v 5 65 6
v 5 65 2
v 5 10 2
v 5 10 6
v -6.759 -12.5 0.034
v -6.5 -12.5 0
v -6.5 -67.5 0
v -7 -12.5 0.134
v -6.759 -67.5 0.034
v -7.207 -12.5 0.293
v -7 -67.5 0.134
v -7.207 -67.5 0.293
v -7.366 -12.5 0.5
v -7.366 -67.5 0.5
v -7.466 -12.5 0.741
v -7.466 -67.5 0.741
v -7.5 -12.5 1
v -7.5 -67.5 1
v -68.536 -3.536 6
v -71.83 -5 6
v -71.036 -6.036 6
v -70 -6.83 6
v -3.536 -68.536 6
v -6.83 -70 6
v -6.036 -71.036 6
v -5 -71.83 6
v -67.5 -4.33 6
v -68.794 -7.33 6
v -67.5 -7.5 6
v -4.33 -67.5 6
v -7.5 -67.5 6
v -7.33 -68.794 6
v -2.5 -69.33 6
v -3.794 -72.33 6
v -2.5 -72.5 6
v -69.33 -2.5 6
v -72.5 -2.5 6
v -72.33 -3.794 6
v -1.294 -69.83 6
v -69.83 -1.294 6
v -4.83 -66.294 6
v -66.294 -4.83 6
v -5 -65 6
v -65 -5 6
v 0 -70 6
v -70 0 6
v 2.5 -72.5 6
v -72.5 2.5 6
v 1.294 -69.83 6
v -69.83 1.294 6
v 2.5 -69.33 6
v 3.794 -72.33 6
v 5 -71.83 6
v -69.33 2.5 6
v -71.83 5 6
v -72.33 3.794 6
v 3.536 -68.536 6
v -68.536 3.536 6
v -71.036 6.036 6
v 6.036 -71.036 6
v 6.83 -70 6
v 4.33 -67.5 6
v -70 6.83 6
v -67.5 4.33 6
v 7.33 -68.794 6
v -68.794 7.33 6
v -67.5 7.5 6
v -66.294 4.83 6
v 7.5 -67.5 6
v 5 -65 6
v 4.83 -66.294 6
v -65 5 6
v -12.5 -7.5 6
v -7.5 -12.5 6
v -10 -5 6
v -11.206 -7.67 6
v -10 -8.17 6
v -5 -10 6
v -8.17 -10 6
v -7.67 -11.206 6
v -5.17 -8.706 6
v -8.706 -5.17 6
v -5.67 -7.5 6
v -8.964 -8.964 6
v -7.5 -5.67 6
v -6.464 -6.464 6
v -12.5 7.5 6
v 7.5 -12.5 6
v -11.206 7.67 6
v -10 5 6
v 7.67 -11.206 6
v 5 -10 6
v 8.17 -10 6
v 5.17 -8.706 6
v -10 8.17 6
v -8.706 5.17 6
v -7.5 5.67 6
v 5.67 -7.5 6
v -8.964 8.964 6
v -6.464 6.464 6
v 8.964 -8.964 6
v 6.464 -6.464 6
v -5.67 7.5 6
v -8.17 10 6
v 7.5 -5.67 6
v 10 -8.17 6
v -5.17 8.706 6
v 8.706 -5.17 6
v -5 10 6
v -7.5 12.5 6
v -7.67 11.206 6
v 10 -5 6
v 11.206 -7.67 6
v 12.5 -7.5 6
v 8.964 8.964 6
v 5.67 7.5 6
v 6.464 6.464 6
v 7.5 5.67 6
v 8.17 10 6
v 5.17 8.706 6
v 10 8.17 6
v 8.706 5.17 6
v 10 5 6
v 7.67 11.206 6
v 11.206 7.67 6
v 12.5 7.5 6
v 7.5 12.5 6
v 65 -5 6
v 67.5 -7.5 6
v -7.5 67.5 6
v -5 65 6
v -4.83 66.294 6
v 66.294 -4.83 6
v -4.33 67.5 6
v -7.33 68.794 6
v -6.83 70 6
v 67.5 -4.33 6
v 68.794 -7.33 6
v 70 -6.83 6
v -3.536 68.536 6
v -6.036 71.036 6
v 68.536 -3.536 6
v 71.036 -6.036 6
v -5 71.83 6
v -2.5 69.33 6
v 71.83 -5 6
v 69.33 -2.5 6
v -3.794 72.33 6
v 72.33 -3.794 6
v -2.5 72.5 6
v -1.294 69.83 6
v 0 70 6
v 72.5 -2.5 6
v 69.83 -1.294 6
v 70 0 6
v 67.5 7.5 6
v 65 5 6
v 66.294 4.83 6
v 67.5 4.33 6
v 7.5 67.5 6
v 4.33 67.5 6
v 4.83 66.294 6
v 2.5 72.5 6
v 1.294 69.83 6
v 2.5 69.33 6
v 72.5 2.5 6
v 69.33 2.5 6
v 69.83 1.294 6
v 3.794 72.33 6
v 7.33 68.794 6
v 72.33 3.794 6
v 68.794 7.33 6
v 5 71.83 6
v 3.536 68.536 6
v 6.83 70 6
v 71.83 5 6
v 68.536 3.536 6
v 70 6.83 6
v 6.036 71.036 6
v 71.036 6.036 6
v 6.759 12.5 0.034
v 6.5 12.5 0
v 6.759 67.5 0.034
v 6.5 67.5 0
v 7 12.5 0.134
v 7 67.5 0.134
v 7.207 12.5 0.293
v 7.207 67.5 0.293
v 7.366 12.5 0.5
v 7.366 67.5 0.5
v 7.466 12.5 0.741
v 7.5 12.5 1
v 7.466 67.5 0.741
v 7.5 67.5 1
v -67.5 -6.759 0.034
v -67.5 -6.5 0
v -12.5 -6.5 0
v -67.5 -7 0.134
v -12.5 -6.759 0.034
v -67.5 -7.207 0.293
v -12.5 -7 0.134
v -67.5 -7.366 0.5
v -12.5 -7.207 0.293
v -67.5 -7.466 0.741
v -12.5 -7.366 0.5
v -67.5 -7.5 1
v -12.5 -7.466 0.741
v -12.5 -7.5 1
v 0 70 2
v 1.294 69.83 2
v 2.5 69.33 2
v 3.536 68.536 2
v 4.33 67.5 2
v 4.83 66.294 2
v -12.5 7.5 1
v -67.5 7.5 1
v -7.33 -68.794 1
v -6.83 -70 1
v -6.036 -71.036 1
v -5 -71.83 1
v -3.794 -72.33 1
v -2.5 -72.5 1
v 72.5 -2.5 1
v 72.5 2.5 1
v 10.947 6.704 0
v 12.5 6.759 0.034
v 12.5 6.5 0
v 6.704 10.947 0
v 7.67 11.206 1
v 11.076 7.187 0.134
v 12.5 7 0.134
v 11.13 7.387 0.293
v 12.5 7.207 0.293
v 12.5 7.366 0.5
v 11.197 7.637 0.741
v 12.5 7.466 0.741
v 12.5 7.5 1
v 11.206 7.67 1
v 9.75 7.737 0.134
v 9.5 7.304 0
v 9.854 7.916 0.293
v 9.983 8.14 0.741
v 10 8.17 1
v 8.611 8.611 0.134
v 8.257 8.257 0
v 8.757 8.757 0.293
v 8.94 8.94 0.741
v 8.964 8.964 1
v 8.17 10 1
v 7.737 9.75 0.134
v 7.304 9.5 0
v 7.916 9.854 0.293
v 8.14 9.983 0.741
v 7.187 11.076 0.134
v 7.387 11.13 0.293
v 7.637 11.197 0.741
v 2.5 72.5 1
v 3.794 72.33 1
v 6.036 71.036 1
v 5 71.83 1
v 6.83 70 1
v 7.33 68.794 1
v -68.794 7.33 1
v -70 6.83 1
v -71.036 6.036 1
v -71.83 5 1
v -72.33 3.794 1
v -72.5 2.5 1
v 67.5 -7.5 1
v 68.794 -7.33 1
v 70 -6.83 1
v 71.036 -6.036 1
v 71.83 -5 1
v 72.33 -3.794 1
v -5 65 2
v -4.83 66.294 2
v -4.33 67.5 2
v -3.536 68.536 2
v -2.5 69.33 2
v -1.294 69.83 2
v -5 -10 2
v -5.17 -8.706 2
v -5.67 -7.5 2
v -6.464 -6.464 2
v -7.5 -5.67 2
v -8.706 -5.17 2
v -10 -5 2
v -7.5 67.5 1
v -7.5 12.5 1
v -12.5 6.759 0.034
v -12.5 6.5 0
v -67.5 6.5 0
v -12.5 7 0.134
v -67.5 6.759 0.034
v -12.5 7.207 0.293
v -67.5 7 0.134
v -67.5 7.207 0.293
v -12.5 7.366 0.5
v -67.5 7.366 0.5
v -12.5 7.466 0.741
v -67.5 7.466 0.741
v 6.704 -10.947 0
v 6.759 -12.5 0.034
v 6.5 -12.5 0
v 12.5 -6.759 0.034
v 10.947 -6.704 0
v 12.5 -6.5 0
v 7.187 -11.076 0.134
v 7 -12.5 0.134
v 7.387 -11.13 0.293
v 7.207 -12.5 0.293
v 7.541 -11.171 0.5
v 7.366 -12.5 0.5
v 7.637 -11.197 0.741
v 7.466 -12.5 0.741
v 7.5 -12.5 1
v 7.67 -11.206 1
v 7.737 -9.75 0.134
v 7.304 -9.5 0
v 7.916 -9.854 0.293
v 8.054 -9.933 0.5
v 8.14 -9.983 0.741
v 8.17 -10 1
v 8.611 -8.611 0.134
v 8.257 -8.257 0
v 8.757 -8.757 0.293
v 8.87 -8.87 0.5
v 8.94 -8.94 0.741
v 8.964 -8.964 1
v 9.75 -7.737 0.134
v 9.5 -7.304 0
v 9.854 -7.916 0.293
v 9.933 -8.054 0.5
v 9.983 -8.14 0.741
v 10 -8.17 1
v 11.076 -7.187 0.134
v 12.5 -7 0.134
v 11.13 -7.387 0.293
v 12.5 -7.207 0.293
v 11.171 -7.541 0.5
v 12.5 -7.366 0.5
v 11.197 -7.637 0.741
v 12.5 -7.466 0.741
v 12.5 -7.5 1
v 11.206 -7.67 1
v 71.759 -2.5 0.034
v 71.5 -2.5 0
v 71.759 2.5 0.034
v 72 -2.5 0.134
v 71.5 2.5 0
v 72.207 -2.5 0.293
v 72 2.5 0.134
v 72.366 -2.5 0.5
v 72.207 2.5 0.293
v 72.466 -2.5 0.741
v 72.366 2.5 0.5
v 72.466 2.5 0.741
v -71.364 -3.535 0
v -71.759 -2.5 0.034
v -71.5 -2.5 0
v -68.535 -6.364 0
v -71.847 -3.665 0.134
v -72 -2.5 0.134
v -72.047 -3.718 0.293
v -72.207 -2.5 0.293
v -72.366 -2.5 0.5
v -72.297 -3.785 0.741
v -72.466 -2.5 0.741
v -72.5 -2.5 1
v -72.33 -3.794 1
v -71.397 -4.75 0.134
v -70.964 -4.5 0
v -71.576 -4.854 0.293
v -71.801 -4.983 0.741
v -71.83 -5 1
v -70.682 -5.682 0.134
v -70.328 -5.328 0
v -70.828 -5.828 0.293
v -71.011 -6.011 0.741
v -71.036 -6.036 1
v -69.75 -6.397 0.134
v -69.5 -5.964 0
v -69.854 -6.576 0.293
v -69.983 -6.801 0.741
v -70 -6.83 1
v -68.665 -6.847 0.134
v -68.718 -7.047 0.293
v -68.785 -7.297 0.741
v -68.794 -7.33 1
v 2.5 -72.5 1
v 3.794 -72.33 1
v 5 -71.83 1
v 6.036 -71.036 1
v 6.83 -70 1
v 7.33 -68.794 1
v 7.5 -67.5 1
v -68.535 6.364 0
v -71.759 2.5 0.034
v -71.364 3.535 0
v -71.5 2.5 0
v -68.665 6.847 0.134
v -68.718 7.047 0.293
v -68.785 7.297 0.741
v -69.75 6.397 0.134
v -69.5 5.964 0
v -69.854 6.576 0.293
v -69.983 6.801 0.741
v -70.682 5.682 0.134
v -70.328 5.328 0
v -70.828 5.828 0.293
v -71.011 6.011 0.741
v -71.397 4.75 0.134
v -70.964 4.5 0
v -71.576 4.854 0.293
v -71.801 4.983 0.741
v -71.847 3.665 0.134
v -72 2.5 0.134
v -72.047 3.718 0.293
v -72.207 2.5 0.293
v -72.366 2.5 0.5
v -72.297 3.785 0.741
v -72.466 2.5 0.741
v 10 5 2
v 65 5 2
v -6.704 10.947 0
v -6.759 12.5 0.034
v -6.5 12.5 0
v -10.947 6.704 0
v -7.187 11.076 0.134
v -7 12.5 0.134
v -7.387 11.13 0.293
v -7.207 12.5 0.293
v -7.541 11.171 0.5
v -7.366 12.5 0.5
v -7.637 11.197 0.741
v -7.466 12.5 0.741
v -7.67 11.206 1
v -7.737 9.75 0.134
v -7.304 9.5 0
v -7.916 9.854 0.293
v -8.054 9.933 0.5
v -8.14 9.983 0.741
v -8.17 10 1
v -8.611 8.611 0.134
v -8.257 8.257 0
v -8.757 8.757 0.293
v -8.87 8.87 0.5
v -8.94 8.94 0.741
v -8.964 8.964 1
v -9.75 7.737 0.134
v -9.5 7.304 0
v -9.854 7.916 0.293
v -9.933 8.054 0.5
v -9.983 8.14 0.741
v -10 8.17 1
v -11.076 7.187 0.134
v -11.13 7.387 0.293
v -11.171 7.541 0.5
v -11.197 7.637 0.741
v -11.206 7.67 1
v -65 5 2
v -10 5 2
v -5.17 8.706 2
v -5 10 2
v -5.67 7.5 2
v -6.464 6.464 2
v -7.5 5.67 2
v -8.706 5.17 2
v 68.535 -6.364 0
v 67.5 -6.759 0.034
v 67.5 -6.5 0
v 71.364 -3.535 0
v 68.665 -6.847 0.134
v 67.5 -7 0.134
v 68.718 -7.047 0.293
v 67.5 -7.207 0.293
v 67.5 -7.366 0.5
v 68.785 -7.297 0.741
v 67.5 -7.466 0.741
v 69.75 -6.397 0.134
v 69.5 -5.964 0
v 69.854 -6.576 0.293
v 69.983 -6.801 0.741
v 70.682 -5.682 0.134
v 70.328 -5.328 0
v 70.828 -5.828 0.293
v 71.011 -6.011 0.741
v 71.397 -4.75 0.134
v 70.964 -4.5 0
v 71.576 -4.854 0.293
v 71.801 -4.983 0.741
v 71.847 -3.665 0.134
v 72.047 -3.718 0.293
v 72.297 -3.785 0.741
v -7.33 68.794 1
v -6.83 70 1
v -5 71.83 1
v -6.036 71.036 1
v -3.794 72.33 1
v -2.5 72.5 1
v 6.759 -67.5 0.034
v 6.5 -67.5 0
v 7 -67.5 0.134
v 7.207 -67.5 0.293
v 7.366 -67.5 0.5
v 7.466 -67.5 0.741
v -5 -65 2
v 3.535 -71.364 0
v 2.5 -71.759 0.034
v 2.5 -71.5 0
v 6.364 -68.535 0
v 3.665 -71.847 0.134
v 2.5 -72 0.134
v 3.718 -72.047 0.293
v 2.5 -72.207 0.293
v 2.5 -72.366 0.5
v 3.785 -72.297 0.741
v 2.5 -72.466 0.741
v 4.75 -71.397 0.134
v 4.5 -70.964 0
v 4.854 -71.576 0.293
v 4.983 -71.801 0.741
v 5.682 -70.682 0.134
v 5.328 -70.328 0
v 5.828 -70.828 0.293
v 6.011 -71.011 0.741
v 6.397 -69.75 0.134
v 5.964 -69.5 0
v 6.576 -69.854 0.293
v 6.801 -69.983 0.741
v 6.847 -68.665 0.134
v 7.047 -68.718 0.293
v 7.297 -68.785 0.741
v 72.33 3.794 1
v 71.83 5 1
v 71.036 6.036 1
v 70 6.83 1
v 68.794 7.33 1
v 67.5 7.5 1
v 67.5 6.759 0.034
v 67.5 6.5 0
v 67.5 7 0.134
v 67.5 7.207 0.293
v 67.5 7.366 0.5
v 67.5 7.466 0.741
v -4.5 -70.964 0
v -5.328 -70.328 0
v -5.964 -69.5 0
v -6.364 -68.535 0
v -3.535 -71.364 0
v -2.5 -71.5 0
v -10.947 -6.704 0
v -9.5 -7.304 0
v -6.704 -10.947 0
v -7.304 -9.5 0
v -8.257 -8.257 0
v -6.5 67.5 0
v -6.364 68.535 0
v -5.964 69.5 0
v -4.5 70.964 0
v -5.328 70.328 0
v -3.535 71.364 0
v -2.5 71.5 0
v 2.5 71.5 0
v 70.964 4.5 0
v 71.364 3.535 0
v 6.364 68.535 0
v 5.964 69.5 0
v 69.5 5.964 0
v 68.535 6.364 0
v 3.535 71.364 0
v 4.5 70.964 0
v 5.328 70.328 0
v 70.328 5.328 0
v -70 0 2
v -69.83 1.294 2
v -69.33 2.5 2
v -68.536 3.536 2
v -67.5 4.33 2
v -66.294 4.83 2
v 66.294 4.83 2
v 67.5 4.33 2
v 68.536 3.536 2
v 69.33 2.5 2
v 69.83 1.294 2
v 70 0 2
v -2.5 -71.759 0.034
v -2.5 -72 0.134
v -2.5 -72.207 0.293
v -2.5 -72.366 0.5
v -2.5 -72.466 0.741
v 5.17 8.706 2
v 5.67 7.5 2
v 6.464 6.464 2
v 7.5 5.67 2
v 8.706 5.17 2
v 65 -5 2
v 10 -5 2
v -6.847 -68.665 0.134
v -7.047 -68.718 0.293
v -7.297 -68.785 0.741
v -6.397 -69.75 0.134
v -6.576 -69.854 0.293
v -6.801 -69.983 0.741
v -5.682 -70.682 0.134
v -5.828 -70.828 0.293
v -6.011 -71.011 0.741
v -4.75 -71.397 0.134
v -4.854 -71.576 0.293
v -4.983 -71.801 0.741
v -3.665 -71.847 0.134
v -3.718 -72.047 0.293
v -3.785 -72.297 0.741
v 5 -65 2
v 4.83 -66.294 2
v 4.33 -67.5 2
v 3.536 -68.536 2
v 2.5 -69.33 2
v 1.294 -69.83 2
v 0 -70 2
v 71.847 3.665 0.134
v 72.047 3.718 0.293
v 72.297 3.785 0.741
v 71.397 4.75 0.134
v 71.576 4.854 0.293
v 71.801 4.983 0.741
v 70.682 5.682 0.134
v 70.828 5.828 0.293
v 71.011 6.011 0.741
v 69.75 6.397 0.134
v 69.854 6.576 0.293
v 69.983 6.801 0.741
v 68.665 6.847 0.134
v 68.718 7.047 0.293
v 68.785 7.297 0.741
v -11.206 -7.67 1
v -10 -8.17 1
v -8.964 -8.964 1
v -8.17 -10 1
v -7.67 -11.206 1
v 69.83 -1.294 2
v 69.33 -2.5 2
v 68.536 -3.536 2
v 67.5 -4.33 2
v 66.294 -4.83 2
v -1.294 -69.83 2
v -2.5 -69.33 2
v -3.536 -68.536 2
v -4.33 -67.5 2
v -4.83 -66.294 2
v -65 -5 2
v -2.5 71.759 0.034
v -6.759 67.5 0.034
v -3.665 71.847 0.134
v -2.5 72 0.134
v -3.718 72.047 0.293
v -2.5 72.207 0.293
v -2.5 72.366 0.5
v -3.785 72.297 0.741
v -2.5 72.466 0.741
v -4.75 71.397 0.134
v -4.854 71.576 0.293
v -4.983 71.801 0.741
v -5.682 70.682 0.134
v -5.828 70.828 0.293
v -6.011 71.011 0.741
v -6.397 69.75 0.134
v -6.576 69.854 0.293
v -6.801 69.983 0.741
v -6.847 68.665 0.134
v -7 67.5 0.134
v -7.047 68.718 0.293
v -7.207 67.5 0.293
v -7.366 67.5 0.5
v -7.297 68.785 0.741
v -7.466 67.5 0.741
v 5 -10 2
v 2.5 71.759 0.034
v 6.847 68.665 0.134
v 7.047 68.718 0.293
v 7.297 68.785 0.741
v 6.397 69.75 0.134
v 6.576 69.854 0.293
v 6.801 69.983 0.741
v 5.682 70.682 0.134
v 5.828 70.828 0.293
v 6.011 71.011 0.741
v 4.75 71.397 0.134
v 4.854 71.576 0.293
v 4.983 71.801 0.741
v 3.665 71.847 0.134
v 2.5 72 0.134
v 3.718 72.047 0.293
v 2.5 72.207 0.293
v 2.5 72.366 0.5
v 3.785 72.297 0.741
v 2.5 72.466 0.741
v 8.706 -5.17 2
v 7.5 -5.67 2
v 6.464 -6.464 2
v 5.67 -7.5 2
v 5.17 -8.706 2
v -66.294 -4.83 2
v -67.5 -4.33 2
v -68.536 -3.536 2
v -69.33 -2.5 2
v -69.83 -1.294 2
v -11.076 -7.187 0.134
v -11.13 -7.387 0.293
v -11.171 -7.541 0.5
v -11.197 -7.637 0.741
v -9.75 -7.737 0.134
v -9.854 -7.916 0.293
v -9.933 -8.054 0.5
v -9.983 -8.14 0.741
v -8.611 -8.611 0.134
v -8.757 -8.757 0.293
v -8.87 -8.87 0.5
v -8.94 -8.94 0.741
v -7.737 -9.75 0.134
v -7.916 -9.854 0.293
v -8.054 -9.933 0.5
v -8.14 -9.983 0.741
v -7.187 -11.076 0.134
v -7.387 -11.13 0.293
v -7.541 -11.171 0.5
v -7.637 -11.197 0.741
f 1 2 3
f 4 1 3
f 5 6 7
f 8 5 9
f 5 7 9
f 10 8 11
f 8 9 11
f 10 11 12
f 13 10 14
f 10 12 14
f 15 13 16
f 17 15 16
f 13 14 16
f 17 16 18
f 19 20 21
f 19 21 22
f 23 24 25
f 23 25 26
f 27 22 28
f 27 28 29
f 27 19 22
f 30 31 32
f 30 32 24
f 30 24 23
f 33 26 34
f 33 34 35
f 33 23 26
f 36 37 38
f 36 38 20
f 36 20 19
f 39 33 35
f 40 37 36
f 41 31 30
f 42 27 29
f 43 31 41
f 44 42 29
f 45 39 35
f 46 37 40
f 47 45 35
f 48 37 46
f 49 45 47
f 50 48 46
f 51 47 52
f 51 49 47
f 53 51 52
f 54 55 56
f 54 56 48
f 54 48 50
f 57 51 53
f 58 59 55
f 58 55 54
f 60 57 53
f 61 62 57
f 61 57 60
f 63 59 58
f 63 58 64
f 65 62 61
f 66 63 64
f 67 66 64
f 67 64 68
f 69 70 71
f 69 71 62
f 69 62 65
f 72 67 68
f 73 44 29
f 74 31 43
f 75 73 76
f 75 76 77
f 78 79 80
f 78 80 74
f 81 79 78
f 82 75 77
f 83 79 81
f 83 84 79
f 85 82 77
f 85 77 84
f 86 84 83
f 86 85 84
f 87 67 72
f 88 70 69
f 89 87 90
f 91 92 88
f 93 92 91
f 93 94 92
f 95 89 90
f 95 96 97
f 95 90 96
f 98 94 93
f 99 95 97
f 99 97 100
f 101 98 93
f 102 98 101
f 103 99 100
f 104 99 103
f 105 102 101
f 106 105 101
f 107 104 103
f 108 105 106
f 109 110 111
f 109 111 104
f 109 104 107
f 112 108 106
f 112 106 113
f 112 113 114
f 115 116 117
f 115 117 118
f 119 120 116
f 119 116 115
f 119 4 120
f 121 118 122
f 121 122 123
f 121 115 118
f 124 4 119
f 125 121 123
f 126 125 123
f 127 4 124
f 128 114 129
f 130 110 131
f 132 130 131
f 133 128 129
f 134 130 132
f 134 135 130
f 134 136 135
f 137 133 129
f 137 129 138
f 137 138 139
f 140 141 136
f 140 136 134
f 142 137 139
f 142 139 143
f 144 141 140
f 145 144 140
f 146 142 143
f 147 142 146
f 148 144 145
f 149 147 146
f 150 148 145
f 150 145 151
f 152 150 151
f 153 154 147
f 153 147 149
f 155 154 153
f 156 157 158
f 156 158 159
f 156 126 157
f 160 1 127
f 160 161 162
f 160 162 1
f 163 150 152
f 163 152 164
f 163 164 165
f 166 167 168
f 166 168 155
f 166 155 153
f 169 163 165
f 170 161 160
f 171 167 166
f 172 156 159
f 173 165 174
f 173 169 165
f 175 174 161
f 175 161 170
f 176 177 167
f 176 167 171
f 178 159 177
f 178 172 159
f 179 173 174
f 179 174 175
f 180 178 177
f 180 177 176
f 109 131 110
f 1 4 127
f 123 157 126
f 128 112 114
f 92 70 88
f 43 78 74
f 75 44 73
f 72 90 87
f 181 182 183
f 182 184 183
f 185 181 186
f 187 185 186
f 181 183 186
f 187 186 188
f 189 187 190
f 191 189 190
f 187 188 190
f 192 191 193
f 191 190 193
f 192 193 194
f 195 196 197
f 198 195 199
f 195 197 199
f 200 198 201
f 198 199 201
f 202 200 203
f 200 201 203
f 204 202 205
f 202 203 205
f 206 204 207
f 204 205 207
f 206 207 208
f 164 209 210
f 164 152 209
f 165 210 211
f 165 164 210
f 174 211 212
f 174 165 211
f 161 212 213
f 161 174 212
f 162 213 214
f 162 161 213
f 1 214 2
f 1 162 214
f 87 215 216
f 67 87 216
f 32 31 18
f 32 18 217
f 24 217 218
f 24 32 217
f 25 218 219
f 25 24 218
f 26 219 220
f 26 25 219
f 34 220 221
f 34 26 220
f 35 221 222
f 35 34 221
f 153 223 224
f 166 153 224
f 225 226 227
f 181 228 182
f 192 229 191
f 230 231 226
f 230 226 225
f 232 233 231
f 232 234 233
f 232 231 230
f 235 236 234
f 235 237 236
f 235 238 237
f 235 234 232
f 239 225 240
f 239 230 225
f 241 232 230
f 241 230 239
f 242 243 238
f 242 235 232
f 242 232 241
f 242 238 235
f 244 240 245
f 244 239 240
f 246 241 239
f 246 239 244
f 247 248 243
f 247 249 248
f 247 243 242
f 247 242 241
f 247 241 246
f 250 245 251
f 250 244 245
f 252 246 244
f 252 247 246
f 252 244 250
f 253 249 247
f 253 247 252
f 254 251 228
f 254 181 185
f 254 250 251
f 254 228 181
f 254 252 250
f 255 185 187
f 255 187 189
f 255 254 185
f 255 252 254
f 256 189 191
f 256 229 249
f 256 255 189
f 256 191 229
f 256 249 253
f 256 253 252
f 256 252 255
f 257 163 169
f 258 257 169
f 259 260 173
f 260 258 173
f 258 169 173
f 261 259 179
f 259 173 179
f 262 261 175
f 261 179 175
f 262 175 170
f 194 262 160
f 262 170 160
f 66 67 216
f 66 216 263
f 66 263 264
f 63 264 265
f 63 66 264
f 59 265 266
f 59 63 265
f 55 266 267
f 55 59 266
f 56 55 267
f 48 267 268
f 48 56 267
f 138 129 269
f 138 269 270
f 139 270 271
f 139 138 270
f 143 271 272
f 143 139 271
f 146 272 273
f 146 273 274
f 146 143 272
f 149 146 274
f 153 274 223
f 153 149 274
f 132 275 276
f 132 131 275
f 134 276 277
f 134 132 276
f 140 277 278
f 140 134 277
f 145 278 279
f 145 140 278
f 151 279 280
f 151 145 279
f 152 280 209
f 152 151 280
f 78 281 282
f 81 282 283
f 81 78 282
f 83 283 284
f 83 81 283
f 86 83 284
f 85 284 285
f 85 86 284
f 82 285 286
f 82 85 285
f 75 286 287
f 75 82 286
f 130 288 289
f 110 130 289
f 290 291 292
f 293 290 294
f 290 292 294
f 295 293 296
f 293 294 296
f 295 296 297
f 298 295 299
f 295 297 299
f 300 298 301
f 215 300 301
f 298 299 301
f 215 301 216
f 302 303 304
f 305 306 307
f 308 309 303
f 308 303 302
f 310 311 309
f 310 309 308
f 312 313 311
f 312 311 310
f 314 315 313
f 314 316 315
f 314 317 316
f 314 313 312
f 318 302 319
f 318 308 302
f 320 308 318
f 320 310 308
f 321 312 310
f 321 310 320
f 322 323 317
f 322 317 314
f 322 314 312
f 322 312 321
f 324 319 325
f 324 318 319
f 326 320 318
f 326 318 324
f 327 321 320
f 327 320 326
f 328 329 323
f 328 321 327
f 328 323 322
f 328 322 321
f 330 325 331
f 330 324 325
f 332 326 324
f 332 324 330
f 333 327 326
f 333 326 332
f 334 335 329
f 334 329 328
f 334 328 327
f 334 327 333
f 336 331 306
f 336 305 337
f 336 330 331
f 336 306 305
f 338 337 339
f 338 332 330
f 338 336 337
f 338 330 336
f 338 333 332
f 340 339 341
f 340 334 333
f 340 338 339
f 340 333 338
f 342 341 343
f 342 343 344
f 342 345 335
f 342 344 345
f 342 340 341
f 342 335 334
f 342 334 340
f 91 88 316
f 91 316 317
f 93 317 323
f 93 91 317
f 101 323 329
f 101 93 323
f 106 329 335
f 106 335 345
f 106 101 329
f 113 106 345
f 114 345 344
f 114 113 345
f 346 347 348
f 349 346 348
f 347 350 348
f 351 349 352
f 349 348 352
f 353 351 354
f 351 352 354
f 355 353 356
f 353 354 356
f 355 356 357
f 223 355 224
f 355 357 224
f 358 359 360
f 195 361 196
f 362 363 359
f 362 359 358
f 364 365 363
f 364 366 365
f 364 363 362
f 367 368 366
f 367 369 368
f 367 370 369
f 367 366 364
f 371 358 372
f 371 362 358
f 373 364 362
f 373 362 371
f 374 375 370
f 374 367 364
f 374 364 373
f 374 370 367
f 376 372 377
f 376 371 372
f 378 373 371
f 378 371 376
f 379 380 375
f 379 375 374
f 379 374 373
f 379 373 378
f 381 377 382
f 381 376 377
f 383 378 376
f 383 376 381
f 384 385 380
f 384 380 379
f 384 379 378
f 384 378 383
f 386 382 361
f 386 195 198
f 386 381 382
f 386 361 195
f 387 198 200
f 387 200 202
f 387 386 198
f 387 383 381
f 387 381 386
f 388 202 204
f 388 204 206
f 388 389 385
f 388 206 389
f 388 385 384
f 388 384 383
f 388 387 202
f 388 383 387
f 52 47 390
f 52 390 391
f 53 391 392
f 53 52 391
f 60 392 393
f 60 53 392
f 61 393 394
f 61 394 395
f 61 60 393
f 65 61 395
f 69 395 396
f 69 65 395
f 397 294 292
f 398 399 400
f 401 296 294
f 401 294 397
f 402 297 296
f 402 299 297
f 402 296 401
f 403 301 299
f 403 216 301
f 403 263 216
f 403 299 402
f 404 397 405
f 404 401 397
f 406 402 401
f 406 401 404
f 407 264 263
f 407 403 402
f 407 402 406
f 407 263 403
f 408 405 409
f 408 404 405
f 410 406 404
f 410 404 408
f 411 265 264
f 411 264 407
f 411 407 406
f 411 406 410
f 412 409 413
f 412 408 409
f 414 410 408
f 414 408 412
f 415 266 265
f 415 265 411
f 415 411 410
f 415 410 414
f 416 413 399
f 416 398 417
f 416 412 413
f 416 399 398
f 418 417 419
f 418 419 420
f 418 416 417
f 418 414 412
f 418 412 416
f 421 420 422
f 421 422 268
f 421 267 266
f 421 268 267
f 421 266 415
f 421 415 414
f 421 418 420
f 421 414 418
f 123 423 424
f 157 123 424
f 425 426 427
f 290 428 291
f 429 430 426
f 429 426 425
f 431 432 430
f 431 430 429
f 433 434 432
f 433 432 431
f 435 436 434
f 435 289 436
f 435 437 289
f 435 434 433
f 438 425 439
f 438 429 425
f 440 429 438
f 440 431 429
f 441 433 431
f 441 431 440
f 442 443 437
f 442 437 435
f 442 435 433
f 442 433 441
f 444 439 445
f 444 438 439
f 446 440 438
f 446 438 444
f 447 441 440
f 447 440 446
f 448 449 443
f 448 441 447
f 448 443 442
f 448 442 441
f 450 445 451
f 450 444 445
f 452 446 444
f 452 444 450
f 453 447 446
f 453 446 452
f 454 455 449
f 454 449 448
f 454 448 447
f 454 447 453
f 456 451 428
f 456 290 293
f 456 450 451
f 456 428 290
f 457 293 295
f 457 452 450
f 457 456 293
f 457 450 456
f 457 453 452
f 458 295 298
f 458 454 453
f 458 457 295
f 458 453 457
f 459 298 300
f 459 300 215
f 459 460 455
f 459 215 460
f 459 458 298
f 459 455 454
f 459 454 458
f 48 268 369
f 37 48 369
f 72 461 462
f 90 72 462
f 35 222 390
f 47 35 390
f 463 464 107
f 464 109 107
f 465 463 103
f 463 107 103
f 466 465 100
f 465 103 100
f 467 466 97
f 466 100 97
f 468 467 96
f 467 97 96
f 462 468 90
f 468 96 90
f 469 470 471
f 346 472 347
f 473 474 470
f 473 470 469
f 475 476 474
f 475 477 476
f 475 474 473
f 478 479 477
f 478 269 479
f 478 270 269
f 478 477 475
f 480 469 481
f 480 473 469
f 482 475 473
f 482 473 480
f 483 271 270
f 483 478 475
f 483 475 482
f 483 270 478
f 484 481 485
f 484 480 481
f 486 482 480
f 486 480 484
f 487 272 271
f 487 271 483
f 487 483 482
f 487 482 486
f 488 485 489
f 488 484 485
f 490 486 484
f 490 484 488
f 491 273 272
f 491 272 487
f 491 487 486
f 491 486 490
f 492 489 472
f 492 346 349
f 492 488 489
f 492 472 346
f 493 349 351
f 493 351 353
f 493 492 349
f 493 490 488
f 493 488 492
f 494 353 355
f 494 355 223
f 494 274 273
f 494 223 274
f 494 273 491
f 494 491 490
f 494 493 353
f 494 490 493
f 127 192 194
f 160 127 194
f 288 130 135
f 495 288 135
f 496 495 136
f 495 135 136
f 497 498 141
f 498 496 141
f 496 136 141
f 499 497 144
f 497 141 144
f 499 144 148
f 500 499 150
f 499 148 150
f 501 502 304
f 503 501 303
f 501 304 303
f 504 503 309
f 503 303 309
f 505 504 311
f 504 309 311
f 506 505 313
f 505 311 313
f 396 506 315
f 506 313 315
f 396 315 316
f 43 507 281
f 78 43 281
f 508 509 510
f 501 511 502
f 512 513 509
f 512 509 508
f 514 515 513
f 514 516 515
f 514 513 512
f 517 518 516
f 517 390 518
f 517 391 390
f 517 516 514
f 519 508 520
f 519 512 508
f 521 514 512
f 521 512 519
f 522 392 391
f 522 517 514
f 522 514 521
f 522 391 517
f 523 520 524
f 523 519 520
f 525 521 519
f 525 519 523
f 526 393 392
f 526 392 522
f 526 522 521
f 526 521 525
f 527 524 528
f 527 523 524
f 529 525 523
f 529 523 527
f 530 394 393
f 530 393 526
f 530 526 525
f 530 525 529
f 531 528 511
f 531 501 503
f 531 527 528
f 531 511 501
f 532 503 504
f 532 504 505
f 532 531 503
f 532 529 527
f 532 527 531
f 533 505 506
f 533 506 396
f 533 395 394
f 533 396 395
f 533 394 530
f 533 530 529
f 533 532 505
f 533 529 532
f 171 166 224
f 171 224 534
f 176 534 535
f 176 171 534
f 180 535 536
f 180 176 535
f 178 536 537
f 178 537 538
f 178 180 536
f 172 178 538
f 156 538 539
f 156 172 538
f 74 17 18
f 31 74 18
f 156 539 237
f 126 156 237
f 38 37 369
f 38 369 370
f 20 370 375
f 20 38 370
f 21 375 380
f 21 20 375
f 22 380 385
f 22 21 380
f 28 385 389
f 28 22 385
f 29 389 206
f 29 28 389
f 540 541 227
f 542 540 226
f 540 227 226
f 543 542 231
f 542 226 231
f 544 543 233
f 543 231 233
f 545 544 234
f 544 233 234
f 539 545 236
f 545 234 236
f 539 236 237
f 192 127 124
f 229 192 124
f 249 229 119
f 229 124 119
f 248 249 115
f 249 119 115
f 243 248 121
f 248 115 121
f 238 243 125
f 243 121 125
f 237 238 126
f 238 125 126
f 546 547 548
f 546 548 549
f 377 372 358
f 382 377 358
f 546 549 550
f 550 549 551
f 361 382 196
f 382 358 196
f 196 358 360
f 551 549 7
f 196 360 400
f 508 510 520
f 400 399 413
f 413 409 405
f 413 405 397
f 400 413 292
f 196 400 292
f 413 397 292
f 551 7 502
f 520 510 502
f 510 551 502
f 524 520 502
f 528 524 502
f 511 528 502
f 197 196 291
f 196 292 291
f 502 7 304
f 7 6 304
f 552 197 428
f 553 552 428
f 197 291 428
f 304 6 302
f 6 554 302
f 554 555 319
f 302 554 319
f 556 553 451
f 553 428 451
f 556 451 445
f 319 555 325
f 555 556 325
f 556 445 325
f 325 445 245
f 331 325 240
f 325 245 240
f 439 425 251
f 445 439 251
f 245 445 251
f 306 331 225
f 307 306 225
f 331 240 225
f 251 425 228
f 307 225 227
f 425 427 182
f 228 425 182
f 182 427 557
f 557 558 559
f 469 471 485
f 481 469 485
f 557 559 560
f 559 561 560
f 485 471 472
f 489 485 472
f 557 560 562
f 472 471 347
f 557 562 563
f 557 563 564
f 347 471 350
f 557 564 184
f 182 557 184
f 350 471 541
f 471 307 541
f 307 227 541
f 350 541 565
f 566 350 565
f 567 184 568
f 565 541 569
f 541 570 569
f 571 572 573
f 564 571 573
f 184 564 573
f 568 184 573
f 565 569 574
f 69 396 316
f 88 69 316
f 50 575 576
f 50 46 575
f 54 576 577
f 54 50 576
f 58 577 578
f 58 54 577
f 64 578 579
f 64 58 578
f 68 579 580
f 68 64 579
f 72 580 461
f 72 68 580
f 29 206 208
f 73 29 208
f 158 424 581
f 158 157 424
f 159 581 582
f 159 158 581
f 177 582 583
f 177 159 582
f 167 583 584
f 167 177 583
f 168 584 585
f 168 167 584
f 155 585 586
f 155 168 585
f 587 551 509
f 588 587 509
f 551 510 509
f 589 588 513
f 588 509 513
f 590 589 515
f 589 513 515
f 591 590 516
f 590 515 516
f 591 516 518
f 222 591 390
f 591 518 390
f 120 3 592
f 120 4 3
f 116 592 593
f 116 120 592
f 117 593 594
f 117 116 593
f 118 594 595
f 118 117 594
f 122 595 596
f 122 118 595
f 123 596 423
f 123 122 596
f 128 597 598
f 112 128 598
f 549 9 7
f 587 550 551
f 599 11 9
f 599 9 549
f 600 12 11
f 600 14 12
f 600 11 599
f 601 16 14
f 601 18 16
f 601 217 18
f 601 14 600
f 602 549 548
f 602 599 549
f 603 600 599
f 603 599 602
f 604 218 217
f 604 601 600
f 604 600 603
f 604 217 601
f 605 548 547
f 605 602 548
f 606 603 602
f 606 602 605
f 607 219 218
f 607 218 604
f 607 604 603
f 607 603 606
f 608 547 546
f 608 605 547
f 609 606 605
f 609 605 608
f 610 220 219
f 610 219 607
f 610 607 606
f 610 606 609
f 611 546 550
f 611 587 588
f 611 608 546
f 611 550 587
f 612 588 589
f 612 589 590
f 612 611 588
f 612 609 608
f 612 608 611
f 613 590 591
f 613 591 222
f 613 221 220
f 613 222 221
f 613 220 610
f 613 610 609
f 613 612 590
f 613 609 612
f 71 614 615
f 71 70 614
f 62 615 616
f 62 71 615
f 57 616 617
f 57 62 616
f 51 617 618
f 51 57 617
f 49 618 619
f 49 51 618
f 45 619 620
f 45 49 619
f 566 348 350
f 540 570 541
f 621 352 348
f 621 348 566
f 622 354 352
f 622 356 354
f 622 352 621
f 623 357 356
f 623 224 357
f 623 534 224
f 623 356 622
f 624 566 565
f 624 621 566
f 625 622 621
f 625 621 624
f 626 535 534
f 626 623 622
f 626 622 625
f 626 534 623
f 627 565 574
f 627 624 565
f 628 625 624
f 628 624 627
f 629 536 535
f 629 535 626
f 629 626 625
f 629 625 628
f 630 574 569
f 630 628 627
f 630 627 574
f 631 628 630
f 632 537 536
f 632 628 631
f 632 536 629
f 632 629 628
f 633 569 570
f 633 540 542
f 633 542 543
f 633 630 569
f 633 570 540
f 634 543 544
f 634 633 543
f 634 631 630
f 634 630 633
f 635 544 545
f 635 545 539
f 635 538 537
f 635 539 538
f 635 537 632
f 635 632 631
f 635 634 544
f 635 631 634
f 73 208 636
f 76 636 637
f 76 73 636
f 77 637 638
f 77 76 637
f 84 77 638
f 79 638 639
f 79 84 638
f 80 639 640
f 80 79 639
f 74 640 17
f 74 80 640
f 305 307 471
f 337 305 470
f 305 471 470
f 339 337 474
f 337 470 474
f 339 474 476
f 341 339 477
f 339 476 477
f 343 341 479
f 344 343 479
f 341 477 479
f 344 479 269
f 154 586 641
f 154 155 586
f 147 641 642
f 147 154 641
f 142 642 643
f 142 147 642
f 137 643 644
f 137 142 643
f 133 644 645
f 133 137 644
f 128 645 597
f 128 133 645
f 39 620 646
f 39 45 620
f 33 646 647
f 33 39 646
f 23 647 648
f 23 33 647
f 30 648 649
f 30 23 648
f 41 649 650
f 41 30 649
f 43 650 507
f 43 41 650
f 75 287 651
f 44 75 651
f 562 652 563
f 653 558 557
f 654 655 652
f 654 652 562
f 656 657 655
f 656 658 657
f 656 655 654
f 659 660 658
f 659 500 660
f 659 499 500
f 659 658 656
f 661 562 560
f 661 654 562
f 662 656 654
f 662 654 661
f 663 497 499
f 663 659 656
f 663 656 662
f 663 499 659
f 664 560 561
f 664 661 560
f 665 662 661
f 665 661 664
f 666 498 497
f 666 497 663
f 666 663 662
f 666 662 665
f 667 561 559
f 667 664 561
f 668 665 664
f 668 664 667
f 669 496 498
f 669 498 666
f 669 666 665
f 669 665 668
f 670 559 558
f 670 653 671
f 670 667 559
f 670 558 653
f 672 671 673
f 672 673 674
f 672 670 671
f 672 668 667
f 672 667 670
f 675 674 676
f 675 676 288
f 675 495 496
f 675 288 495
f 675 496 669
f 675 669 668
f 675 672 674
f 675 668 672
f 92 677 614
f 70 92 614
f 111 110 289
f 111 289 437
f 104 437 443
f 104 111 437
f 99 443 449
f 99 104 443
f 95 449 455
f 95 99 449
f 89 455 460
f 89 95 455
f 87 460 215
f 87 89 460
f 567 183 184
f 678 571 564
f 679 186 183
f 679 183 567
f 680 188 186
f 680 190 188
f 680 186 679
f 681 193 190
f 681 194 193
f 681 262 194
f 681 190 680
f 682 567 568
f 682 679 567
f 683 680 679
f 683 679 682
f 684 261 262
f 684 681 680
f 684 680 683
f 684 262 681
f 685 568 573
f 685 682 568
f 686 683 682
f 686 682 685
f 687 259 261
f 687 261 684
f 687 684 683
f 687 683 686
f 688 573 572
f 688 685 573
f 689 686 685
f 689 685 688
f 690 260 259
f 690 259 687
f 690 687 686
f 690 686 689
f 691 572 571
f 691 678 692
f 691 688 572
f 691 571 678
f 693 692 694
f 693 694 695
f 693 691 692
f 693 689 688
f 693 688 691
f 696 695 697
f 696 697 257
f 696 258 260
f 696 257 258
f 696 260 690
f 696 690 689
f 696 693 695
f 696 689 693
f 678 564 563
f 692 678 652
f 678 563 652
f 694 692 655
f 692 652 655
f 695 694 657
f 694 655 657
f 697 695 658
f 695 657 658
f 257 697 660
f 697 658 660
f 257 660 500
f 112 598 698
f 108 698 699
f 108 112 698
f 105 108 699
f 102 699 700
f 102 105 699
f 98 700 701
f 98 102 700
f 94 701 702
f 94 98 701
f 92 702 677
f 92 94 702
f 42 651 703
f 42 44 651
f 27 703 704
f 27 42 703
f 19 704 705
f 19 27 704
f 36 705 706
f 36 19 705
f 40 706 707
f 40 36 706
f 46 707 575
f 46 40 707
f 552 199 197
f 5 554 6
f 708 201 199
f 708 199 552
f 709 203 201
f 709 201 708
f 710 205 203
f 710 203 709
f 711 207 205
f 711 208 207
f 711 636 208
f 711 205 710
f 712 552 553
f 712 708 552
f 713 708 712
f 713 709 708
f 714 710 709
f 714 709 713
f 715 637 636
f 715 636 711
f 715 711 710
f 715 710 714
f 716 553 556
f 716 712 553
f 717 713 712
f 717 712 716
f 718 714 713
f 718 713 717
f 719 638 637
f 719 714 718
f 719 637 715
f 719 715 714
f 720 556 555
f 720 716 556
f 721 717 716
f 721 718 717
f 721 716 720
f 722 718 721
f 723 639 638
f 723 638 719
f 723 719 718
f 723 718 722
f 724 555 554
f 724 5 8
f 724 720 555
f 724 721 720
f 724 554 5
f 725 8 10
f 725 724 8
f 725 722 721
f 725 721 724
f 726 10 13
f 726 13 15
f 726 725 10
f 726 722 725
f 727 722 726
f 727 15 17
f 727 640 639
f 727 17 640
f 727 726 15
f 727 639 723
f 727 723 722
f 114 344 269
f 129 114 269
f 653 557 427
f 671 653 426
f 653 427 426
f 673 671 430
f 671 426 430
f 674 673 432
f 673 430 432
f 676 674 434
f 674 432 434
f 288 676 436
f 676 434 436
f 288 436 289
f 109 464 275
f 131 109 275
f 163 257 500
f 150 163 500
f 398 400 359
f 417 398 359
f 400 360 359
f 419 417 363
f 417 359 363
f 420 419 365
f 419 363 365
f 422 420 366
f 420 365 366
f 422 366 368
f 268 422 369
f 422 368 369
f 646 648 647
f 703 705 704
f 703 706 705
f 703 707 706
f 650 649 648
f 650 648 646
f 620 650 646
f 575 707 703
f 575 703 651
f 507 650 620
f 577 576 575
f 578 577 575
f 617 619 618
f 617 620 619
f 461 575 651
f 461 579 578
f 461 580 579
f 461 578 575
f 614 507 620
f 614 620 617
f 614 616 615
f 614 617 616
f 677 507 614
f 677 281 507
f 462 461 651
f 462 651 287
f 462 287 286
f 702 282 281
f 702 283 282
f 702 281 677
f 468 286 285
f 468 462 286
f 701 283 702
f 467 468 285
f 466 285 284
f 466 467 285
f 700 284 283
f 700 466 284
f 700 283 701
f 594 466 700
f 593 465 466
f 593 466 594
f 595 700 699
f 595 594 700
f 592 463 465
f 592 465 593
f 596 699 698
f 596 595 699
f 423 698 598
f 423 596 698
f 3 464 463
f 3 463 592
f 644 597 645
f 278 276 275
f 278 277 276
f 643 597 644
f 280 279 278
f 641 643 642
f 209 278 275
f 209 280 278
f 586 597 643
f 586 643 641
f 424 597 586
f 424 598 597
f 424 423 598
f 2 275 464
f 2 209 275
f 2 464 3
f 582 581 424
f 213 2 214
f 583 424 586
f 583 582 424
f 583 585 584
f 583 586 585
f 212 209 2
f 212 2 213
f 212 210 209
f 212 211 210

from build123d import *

# Parameters (mm, degrees)
F1_DEPTH = 2
F2_DEPTH = 6
F3_R     = 4.99999
F4_R     = 1


# Not quite as in the source:
# - a fillet or chamfer is up to 0.001 mm smaller than in the source, because OpenCascade refuses the exact size


with BuildPart() as f1:
    # F0 (on Top) → F1 (new body)
    with BuildSketch(Plane.XY):
        Polygon((5, 70), (0, 70), (-5, 70), (-5, 5), (-70, 5), (-70, -5), (-5, -5), (-5, -70), (0, -70), (5, -70), (5, -5), (70, -5), (70, 5), (5, 5), align=None)
    extrude(amount=F1_DEPTH)

    # F0 (on Top) → F2 (join)
    with BuildSketch(Plane.XY):
        Polygon((0, 72.5), (-7.5, 72.5), (-7.5, 7.5), (-72.5, 7.5), (-72.5, 6.8834697455), (-72.5, -7.5), (-7.5, -7.5), (-7.5, -72.5), (0, -72.5), (7.5, -72.5), (7.5, -7.5), (72.5, -7.5), (72.5, 7.5), (7.5, 7.5), (7.5, 72.5), align=None)
        Polygon((-5, 70), (0, 70), (5, 70), (5, 5), (70, 5), (70, -5), (5, -5), (5, -70), (0, -70), (-5, -70), (-5, -5), (-70, -5), (-70, 5), (-5, 5), align=None, mode=Mode.SUBTRACT)
    extrude(amount=F2_DEPTH)

    # F3 (radius 5 in the source; OpenCascade refuses exactly that, so slightly less here)
    f3_edges = [f1.edges().sort_by_distance(p)[0] for p in [
        (-5, 70, 4),
        (-70, 5, 4),
        (5, 70, 4),
        (70, 5, 4),
        (70, -5, 4),
        (5, -70, 4),
        (-70, -5, 4),
        (-5, -70, 4),
        (-7.5, 72.5, 3),
        (7.5, 72.5, 3),
        (72.5, 7.5, 3),
        (72.5, -7.5, 3),
        (7.5, -72.5, 3),
        (-72.5, 7.5, 3),
        (-72.5, -7.5, 3),
        (-7.5, -72.5, 3),
        (-7.5, -7.5, 3),
        (-5, 5, 4),
        (5, 5, 4),
        (5, -5, 4),
        (-7.5, 7.5, 3),
        (-5, -5, 4),
        (7.5, 7.5, 3),
        (7.5, -7.5, 3),
    ]]
    fillet(f3_edges, radius=F3_R)

    # F4
    f4_edges = [f1.edges().sort_by_distance(p)[0] for p in [
        (7.5, 40, 0),
    ]]
    fillet(f4_edges, radius=F4_R)


solid = f1.part
